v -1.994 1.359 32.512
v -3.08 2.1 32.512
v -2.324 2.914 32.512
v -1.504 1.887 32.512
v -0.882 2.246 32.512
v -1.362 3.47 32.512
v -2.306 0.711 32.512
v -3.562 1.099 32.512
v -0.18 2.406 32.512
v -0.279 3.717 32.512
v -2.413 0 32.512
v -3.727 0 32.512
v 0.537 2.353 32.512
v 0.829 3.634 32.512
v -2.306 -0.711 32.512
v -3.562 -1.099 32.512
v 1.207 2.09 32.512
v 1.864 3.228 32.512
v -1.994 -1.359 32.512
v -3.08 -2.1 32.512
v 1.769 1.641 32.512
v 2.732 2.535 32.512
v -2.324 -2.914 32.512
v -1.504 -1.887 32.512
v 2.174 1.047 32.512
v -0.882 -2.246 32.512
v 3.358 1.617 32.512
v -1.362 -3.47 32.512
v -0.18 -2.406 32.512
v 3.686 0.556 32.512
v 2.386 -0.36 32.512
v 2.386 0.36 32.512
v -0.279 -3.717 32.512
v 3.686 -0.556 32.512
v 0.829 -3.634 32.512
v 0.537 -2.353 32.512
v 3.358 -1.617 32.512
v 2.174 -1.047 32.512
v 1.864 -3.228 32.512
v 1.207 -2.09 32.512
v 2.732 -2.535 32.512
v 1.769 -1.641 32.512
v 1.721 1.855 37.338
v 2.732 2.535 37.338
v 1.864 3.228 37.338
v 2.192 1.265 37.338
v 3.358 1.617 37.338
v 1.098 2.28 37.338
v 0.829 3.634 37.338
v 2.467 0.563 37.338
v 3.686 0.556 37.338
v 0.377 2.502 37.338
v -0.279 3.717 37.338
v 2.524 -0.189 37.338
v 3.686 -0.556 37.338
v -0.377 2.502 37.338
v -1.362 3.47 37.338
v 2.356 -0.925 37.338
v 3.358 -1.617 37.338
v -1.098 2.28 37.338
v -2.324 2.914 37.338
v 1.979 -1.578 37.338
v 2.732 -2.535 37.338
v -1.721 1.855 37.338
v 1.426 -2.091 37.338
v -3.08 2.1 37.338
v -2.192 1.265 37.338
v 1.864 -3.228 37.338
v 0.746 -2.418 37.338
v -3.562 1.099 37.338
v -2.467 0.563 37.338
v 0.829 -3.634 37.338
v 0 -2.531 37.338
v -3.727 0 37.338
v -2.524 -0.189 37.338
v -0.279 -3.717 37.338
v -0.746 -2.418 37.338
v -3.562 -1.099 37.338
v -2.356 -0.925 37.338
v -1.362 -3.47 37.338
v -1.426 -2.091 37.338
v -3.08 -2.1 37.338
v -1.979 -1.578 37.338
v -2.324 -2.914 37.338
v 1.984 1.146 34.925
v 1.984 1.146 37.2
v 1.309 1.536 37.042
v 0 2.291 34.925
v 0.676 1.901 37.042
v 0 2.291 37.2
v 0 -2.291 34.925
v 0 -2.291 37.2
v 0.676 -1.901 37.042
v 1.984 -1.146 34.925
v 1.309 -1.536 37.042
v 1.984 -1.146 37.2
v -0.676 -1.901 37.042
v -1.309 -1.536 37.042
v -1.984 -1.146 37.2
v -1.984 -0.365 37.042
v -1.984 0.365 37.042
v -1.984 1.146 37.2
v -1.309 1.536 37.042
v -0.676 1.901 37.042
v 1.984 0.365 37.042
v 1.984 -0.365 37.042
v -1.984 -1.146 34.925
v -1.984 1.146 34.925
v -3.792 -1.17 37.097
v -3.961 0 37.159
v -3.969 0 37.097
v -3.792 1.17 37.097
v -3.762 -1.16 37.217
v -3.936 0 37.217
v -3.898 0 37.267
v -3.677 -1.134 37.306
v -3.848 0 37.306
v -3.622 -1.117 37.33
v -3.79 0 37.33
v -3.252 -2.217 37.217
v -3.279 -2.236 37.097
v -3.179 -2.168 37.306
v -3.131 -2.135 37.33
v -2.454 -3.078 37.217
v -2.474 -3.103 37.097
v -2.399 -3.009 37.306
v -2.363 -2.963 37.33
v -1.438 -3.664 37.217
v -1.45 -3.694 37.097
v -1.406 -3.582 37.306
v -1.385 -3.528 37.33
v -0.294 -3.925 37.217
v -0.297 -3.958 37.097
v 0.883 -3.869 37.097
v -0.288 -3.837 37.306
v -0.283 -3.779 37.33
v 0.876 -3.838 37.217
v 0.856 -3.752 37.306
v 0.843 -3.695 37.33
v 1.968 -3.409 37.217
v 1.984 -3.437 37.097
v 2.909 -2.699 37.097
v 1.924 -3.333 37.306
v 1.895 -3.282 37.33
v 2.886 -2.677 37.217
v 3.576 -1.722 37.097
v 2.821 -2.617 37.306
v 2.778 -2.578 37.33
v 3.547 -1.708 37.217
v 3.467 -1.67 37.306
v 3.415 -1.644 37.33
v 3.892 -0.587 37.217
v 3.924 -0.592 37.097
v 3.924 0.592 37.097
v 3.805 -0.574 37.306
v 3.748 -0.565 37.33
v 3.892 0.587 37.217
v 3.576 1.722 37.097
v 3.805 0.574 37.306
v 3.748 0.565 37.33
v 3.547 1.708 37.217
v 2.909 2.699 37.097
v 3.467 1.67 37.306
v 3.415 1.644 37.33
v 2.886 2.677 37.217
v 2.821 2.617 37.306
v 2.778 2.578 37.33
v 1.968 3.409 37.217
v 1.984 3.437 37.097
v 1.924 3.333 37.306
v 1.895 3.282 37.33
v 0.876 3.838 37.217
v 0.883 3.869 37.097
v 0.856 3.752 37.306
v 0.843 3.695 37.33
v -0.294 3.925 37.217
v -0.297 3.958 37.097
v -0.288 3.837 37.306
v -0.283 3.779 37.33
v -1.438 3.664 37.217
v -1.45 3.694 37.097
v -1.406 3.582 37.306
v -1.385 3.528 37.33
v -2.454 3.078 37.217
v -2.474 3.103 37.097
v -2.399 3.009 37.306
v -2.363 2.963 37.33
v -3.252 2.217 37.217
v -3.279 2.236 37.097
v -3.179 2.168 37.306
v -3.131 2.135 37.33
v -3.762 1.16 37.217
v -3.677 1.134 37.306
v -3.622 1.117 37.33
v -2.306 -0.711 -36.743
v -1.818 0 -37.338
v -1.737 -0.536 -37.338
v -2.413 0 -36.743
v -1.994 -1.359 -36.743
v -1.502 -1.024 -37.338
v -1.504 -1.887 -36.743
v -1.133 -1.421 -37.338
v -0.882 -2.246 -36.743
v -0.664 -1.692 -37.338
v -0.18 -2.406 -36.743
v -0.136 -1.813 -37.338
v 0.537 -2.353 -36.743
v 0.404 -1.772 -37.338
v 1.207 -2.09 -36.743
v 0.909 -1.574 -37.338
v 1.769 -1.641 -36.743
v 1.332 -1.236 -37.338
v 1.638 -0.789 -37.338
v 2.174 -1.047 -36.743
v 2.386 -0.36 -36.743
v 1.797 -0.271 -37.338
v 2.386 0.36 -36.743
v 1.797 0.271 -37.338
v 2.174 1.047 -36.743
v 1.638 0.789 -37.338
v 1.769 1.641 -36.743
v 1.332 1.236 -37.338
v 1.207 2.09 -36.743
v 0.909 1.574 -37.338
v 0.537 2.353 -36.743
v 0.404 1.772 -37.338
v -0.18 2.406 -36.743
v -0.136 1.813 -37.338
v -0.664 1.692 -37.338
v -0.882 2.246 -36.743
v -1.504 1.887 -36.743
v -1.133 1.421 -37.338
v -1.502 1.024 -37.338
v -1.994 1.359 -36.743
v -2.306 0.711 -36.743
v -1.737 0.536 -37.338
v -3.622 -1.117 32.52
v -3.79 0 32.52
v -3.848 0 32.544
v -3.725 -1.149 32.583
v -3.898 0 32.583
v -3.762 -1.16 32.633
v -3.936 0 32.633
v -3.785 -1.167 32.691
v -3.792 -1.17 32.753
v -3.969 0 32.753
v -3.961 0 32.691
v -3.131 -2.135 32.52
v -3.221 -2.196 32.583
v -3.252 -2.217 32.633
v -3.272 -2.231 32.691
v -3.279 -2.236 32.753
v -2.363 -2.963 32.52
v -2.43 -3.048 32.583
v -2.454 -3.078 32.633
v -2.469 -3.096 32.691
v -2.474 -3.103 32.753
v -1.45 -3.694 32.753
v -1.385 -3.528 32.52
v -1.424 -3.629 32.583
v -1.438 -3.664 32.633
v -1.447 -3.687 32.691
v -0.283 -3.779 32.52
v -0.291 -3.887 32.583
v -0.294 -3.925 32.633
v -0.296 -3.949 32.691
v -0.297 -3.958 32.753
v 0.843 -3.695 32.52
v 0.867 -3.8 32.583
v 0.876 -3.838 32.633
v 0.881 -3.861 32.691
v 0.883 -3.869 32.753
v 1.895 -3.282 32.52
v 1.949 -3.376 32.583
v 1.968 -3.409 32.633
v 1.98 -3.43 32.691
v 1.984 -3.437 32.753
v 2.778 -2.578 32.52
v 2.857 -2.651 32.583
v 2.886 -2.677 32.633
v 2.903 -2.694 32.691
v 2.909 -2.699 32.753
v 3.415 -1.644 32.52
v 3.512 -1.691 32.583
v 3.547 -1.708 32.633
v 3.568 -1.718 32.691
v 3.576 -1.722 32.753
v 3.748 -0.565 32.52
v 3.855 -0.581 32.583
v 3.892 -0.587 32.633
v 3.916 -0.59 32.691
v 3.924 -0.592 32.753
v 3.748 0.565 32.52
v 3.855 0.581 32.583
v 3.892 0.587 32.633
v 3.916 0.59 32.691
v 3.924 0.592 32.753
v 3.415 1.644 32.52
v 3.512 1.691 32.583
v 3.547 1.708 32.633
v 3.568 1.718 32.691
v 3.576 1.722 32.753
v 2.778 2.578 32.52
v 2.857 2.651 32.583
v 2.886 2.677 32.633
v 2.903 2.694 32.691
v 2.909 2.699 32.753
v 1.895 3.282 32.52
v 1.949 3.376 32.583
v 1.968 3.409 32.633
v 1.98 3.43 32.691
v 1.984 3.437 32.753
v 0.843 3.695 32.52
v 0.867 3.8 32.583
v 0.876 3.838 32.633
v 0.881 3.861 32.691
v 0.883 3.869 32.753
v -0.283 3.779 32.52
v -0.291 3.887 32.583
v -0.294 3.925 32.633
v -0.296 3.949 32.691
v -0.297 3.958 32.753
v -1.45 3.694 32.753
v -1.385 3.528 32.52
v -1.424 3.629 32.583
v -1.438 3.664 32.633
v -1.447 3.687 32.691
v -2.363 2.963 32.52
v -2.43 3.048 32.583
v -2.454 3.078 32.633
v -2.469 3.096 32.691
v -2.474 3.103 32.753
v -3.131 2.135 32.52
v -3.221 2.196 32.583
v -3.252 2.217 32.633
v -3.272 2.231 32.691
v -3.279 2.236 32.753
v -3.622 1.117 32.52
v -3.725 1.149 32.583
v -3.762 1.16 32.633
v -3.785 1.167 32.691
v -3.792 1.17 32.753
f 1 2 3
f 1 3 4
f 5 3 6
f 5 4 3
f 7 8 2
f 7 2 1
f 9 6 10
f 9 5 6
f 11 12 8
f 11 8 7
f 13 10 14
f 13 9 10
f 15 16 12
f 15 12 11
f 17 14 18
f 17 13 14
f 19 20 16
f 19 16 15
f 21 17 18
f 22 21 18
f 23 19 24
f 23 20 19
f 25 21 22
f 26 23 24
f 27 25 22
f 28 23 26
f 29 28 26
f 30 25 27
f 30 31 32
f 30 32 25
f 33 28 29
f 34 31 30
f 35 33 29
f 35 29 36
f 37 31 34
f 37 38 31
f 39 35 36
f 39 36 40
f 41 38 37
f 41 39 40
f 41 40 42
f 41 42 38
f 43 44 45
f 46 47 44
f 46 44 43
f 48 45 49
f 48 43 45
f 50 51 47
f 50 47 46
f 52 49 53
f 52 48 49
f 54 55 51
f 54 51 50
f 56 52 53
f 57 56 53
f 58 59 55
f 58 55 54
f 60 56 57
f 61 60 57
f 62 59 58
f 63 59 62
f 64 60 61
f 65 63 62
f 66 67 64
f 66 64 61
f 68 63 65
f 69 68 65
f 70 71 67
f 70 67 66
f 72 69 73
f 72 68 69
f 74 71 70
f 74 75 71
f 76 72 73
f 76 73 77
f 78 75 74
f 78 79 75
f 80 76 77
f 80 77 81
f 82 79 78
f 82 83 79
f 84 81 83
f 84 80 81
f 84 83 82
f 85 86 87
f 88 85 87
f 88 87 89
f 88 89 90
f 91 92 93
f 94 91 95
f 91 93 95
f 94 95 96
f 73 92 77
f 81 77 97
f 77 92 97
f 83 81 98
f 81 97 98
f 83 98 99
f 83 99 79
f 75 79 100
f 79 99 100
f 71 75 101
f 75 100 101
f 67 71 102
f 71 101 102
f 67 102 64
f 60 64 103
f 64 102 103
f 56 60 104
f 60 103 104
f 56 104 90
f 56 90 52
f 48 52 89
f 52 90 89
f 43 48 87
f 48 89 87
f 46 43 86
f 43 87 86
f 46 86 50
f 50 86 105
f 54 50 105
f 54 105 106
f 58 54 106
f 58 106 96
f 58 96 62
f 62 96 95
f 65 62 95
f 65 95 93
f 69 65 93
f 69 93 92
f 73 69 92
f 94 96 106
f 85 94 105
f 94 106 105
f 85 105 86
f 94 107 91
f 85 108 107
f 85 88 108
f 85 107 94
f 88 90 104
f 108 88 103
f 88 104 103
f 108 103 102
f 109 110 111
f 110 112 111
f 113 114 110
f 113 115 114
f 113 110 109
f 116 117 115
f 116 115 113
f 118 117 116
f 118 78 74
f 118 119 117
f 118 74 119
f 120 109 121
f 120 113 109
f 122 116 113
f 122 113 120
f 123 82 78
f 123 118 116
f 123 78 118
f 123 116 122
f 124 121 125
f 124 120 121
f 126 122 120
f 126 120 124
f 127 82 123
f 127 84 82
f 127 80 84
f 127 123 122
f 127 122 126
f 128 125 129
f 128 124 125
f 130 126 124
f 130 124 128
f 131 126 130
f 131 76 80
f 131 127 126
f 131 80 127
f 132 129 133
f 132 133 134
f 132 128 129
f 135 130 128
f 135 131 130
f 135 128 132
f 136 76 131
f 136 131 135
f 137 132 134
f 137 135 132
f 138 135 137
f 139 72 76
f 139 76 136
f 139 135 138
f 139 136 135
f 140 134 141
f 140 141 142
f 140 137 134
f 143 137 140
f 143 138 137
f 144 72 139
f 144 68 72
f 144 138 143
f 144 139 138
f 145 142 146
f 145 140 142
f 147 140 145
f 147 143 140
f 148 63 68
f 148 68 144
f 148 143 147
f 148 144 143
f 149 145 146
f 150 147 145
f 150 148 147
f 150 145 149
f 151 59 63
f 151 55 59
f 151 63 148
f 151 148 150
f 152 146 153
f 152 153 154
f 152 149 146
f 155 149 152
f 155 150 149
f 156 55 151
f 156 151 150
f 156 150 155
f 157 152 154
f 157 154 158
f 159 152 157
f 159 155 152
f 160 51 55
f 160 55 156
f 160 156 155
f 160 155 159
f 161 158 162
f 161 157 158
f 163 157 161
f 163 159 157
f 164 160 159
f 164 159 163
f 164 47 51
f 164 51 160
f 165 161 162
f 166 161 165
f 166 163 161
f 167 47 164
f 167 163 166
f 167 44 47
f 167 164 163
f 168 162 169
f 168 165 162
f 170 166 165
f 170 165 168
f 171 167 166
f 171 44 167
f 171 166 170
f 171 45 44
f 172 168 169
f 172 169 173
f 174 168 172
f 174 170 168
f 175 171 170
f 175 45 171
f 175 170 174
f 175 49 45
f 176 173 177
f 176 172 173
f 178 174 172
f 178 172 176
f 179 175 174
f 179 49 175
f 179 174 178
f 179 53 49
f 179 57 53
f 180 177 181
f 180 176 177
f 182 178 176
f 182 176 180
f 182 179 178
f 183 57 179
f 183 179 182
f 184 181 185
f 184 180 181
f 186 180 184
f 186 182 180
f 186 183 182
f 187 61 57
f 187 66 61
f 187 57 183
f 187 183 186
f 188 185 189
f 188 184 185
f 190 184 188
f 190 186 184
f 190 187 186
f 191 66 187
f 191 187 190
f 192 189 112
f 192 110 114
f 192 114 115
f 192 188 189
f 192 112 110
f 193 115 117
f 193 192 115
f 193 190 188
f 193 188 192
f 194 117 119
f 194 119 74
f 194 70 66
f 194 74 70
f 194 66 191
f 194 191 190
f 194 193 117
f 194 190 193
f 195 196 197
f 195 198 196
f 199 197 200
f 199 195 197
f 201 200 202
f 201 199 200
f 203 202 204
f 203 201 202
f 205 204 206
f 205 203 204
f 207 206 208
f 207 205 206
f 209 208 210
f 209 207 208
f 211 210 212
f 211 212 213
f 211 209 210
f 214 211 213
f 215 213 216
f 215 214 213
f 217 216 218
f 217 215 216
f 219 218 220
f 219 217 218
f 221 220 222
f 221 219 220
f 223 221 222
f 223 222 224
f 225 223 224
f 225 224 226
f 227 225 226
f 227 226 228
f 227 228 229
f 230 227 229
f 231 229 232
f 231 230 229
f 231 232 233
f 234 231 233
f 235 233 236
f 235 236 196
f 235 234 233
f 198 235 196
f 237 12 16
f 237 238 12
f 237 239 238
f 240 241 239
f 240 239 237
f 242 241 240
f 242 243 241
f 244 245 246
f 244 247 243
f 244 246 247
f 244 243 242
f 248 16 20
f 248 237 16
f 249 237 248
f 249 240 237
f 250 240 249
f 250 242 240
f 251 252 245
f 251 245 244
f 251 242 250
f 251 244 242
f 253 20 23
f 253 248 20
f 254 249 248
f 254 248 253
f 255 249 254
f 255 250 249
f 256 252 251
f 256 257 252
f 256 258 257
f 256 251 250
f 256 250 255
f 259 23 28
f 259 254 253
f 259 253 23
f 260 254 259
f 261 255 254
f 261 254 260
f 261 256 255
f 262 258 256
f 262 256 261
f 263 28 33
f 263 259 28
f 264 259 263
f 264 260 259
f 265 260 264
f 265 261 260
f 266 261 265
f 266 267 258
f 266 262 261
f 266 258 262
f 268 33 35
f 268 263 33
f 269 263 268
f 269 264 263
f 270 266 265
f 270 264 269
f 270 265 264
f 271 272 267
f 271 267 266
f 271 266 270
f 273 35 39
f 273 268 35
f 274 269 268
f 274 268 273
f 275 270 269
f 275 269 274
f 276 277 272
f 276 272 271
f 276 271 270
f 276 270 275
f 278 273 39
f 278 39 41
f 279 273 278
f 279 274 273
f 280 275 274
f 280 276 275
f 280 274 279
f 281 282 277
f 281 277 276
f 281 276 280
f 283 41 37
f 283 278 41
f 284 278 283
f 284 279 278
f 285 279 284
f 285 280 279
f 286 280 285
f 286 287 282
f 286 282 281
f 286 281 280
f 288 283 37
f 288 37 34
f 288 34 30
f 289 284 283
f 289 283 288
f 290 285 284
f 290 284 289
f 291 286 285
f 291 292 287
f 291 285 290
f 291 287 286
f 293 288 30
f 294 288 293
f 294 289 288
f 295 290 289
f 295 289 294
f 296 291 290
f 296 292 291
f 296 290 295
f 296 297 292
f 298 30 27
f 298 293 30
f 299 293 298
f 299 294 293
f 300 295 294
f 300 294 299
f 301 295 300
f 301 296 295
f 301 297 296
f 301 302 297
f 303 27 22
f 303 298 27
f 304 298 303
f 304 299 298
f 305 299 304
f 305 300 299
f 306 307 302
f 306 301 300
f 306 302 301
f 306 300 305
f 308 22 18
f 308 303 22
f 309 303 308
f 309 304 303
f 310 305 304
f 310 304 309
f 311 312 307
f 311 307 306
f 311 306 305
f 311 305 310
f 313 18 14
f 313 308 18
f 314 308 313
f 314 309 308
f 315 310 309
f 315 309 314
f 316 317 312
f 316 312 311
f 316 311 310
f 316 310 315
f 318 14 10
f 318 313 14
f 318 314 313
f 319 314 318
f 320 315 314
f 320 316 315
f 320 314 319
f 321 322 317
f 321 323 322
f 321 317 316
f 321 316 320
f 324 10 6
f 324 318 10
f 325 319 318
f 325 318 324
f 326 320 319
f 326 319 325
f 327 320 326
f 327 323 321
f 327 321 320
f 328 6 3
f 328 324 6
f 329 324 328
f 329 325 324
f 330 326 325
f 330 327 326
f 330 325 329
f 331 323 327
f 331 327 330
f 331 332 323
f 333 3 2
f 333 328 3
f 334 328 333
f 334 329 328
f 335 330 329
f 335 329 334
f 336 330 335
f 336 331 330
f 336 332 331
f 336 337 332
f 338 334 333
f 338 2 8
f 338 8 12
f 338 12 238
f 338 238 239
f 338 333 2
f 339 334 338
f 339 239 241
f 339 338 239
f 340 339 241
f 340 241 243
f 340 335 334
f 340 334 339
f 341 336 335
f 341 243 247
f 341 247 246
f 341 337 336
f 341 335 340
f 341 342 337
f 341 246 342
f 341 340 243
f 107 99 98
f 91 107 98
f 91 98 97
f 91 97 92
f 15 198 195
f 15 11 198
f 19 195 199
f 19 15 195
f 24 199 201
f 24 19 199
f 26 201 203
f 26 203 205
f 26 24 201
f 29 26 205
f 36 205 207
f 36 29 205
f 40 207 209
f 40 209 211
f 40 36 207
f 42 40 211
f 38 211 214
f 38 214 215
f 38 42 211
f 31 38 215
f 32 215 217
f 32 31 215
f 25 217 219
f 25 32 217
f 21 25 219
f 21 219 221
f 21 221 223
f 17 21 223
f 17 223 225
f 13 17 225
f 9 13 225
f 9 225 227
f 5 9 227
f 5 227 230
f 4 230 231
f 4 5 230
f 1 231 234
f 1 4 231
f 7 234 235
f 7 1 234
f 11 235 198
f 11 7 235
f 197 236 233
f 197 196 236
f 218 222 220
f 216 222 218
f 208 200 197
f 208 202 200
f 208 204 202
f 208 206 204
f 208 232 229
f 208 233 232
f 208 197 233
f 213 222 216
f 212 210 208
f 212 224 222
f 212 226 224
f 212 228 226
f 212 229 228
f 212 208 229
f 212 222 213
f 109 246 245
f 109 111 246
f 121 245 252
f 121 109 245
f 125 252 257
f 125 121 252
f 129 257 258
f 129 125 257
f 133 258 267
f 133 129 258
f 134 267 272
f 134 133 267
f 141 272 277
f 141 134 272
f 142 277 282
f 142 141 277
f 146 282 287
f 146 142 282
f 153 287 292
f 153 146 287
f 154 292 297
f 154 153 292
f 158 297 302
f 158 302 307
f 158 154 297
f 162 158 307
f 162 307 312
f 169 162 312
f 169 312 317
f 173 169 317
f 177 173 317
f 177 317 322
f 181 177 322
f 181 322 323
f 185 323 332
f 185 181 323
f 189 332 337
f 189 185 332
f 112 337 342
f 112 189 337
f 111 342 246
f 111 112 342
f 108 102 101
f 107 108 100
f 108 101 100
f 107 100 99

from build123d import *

# Parameters (mm, degrees)
CUT_EXTRUDE1_START = 37.338
CUT_EXTRUDE1_DEPTH = 2.413


with BuildPart() as part:
    # Sketch2 → Revolve1 (revolve)
    with BuildSketch(Plane(origin=(0, 0, 0), x_dir=(0, 0, -1), z_dir=(1, 0, 0)), mode=Mode.PRIVATE) as revolve1_sk:
        with BuildLine():
            Line((37.338, 0), (37.338, 1.8176875))
            Line((37.338, 1.8176875), (36.7426875, 2.413))
            Line((36.7426875, 2.413), (-32.512, 2.413))
            Line((-32.512, 2.413), (-32.512, 3.72745))
            ThreePointArc((-32.512, 3.72745), (-32.582675134, 3.898074866), (-32.7533, 3.96875))
            Line((-32.7533, 3.96875), (-37.0967, 3.96875))
            ThreePointArc((-37.0967, 3.96875), (-37.267324866, 3.898074866), (-37.338, 3.72745))
            Line((-37.338, 3.72745), (-37.338, 0))
            Line((-37.338, 0), (37.338, 0))
        make_face()
    revolve(revolve1_sk.sketch.rotate(Axis((0, 0, -37.338), (0, 0, 1)), 90), axis=Axis((0, 0, -37.338), (0, 0, 1)))

    # Sketch3 → Cut-Extrude1 (cut)
    with BuildSketch(Plane.XY.offset(CUT_EXTRUDE1_START)):
        Polygon((-1.984375, 1.14567944), (-1.984375, -1.14567944), (0, -2.291358881), (1.984375, -1.14567944), (1.984375, 1.14567944), (0, 2.291358881), align=None)
    extrude(amount=-CUT_EXTRUDE1_DEPTH, mode=Mode.SUBTRACT)

    # Cut-Extrude2 cone 1 section (through the dimple's axis) → Cut-Extrude2 (revolve, cut)
    with BuildSketch(Plane(origin=(0, 0, 37.338), x_dir=(0, -1, 0), z_dir=(1, 0, 0))):
        Polygon((0, 0), (2.530707401, 0), (0, 1.461104599), align=None)
    revolve(axis=Axis((0, 0, 37.338), (0, 0, -1)), mode=Mode.SUBTRACT)


solid = part.part
